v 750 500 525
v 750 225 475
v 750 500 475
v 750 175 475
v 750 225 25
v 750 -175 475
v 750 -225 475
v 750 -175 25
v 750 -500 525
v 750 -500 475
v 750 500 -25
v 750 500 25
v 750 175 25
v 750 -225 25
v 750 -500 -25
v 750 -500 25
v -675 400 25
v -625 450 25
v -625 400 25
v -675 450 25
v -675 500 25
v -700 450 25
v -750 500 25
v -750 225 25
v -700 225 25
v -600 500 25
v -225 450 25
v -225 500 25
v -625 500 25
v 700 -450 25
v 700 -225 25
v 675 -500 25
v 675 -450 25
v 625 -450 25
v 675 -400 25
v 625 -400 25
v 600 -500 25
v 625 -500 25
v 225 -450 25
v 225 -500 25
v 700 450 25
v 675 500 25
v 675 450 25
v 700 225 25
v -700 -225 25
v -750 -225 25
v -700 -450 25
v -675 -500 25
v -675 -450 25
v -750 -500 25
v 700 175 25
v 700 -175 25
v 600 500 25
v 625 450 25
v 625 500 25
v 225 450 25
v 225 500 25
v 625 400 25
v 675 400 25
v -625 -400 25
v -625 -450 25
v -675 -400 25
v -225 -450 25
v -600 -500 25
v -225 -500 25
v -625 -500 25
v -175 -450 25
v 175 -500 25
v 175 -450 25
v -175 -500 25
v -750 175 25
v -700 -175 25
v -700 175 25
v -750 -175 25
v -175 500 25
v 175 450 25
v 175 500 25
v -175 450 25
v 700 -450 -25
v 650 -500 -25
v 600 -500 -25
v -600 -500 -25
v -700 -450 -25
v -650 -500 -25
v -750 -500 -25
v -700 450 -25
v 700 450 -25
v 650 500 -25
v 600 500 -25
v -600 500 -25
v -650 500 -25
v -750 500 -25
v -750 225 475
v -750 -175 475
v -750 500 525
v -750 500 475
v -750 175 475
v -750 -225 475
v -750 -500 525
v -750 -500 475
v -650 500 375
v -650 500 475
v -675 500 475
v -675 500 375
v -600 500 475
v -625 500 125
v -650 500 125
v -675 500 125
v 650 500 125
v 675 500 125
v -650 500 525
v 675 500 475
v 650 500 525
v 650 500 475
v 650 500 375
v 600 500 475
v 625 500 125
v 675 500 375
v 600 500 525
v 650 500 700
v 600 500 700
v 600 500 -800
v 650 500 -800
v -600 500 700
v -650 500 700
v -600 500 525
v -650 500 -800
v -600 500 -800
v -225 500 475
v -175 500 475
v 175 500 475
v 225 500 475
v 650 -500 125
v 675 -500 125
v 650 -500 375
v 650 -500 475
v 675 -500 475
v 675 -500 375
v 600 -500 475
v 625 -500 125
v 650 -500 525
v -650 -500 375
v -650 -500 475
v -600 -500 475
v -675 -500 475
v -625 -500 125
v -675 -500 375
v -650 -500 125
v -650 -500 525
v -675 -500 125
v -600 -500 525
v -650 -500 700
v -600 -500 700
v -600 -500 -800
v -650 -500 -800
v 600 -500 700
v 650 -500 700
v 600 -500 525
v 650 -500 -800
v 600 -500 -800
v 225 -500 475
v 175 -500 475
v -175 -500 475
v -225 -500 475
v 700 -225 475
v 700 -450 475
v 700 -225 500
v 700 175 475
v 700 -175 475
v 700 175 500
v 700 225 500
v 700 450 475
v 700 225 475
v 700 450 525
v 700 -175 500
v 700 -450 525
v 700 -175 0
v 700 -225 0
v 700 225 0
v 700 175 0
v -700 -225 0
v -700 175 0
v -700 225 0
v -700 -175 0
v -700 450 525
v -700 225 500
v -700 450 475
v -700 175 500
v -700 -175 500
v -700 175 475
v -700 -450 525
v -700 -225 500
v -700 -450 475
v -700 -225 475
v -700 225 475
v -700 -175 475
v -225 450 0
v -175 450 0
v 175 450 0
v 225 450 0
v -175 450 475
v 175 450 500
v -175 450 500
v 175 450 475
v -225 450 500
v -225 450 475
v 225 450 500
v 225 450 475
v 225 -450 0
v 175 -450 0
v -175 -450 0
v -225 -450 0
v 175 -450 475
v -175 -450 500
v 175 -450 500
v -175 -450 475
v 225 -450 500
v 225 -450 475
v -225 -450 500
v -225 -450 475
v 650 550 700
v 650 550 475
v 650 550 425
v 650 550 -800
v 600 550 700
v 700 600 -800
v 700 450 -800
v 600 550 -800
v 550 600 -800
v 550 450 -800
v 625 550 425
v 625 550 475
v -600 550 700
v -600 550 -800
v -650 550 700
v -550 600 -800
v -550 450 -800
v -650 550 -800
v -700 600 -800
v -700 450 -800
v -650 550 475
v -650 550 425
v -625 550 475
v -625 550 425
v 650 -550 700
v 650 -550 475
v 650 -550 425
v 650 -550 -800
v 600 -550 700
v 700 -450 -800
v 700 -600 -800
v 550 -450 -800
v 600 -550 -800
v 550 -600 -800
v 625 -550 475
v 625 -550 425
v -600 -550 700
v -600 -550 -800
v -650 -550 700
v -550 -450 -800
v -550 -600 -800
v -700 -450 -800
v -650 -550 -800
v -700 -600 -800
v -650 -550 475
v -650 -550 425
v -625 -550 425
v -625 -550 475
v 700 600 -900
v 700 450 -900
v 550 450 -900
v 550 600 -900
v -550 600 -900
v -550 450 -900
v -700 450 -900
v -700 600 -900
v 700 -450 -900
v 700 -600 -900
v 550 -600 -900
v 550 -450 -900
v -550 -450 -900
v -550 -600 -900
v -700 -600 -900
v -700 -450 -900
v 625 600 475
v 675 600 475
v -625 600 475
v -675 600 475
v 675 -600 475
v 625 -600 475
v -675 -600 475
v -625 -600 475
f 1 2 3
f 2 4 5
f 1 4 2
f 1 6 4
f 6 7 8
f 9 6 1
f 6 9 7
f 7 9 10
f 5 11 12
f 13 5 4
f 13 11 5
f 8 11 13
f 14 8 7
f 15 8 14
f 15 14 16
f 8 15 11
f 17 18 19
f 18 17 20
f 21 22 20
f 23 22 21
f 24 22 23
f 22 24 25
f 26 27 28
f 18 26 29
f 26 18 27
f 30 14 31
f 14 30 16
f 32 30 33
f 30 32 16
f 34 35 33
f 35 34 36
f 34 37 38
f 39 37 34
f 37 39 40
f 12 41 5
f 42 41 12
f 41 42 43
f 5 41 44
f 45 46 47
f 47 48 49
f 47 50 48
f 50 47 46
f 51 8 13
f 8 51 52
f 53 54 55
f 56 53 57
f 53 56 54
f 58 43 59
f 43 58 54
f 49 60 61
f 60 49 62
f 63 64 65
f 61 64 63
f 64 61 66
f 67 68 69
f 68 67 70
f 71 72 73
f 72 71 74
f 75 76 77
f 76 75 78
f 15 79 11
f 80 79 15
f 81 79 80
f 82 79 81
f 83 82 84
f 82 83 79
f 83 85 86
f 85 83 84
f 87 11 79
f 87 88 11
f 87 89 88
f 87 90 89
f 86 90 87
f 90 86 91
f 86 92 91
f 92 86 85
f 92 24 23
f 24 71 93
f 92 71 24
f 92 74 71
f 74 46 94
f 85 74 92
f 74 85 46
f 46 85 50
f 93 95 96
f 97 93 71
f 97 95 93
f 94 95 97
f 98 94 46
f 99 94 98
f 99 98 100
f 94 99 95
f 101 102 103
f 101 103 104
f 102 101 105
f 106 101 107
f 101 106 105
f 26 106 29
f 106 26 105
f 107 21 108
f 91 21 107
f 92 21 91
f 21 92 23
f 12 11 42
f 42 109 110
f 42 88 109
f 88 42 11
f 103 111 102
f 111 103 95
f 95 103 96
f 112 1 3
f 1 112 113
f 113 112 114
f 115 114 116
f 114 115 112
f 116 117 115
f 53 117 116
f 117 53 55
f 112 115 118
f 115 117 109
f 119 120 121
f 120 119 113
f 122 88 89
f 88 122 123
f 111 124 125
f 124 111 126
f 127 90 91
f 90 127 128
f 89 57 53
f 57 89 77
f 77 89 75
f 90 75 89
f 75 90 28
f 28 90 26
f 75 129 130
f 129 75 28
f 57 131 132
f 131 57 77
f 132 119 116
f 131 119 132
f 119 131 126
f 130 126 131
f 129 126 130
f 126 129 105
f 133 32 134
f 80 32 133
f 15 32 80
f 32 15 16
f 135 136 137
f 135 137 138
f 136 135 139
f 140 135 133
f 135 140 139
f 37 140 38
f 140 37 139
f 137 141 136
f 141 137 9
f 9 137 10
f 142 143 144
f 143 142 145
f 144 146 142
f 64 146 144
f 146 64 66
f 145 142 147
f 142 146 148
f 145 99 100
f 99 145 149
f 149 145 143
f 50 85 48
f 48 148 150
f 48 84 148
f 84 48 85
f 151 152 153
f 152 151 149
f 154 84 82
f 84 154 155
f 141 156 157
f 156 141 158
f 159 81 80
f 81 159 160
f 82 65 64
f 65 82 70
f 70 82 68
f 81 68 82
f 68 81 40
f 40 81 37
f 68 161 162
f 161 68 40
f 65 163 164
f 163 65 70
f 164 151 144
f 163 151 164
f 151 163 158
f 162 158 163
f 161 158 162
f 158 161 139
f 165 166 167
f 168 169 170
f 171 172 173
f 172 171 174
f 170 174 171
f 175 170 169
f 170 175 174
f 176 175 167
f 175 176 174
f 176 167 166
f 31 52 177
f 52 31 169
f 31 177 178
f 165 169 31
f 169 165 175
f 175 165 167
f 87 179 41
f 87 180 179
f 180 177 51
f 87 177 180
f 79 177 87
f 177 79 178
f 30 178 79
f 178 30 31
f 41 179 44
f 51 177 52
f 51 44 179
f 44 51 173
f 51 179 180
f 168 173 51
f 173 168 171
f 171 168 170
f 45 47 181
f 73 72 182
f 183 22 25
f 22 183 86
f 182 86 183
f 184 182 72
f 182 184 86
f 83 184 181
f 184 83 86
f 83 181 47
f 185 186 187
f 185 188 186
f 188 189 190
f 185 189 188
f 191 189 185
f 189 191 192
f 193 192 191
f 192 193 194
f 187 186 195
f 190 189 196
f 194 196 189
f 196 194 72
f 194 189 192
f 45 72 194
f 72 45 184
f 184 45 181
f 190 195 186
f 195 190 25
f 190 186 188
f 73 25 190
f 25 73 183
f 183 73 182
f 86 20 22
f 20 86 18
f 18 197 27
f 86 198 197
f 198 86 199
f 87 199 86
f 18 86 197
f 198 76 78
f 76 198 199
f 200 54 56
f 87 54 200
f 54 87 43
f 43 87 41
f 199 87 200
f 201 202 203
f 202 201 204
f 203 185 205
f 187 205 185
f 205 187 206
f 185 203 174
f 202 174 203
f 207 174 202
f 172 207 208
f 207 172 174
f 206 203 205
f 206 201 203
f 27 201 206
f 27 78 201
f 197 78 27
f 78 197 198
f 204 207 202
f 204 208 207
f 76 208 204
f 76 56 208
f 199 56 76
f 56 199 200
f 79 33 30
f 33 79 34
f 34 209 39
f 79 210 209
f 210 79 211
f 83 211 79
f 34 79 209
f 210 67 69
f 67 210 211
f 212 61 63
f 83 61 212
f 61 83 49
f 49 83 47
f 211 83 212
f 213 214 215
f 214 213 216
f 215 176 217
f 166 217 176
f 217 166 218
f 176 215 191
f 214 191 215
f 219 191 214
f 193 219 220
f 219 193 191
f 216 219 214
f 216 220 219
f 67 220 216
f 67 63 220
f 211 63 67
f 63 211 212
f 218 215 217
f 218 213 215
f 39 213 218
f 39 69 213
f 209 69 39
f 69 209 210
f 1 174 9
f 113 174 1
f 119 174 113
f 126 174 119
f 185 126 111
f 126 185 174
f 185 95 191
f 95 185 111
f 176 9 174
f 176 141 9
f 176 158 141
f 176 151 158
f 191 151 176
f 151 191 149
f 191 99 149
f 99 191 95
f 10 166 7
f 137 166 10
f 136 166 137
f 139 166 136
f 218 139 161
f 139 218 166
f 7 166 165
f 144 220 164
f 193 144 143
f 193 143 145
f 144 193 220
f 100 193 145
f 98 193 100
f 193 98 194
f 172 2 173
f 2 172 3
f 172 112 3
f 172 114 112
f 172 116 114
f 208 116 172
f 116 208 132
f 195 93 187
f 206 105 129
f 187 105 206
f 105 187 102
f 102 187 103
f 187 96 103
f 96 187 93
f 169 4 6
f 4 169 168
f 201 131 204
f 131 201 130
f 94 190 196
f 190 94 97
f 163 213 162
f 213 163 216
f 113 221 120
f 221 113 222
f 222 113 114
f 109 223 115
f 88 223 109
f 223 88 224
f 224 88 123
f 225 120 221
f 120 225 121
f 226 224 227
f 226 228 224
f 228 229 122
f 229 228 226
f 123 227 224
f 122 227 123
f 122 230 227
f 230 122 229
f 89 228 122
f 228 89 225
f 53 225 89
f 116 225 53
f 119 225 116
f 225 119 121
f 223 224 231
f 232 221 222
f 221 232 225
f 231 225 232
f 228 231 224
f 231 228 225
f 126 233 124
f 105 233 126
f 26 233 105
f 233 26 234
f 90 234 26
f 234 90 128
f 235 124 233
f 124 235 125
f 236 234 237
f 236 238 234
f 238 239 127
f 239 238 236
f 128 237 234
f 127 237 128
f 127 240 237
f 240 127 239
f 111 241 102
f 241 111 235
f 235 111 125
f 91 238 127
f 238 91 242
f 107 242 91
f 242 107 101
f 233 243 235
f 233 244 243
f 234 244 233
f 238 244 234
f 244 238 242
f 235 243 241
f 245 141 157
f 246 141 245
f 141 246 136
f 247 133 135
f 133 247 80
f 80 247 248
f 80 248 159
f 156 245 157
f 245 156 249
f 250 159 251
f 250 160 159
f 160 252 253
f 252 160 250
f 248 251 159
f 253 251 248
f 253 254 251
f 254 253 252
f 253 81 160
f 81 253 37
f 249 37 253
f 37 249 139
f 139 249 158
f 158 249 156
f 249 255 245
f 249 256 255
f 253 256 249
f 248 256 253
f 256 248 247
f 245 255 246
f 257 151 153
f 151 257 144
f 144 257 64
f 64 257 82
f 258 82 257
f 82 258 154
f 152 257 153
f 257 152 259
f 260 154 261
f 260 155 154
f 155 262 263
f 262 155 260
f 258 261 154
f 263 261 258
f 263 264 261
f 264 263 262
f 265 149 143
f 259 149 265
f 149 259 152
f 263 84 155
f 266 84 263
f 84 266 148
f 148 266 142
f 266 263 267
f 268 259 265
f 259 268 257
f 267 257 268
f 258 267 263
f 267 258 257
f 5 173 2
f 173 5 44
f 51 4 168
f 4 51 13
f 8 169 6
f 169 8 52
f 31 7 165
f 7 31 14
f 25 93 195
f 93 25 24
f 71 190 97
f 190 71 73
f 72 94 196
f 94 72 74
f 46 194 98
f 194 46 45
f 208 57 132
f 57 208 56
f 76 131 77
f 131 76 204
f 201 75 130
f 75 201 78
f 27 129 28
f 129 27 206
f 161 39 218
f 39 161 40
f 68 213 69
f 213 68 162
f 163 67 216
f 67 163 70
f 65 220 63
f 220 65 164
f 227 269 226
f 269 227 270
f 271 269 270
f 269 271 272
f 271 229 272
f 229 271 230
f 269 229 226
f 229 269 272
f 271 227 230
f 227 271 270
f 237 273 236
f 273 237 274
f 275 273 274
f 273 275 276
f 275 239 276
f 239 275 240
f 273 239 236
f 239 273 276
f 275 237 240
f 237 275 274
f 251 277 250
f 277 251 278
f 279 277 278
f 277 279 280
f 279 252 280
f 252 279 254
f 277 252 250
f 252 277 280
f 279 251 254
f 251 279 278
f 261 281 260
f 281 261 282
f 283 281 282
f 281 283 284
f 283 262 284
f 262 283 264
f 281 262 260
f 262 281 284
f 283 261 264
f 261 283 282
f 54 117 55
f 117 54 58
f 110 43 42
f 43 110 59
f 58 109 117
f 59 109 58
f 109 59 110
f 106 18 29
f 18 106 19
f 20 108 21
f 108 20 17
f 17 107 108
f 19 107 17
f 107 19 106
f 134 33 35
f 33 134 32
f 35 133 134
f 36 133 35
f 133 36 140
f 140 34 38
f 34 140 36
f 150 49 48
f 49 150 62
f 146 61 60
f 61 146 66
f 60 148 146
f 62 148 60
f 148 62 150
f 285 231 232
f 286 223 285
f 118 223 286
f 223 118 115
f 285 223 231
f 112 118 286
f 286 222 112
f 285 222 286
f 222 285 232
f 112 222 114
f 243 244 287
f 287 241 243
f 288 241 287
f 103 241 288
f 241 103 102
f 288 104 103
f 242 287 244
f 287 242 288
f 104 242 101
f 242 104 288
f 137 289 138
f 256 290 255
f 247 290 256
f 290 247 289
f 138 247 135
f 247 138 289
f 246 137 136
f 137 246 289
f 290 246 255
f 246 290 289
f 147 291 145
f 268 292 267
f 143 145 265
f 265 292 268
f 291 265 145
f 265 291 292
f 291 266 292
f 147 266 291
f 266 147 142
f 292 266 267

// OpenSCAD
// ===== 본체 파라메터 (상/하단 공유) =====
body_width = 1500;   // X축 너비
body_depth = 1000;   // Y축 깊이
body_height = 50;    // Z축 높이
body_wall = 50;      // 외벽 두께

// 본체 Z축 위치
body_top_z = 0;      // 상단 본체 Z 위치
body_bottom_z = 500; // 하단 본체 Z 위치 (기둥 바닥에 맞춤)

// ===== 기둥 파라메터 =====
pillar_width = 50;   // 기둥 X축 너비
pillar_depth = 50;   // 기둥 Y축 깊이
pillar_height = 1500; // 기둥 높이

// 기둥 위치 계산 (프레임 외곽 모서리에 붙임)
pillar_pos_x = body_width/2 - pillar_width/2 - 100;   // X축 위치
pillar_pos_y = body_depth/2 - pillar_depth/2 + pillar_depth;   // Y축 위치
pillar_pos_z = pillar_height/2 - 100;                 // Z축 위치 (기둥 바닥이 본체 중심에 맞춤)
pillar_offset_z = -700;                            // Z축 추가 오프셋

// ===== 지지대 파라메터 =====
support_width = 50;   // 지지대 X축 너비
support_depth = 50;   // 지지대 Y축 깊이
support_height = body_bottom_z - body_top_z;  // 지지대 높이 (본체 사이 거리)

// 지지대 위치 계산 (양옆 X축 외곽에 붙임)
support_pos_x = body_width/2 - support_width/2;   // X축 위치 (외곽)
support_pos_y_offset = 200;  // Y축 간격 (중심에서 떨어진 거리)
support_pos_z = (body_top_z + body_bottom_z) / 2;  // Z축 위치 (두 본체 중간)

// 전후면 지지대 위치 계산 (Y축 외곽에 붙임)
support_pos_y = body_depth/2 - support_depth/2;   // Y축 위치 (외곽)
support_pos_x_offset = 200;  // X축 간격 (중심에서 떨어진 거리)

// ===== 브라켓 파라메터 (바퀴 받침) =====
bracket_width = 150;   // 브라켓 너비 (X축)
bracket_depth = 150;   // 브라켓 깊이 (Y축)
bracket_height = 100;  // 브라켓 높이 (Z축)

// 브라켓 위치 계산 (기둥 바닥 아래)
pillar_bottom_z = pillar_pos_z + pillar_offset_z - pillar_height/2;  // 기둥 바닥 Z 위치
bracket_pos_z = pillar_bottom_z - bracket_height/2;  // 브라켓 Z 위치

// ===== 삼각형 고정부품 파라메터 =====
gusset_size = 100;                // 삼각형 변 길이
gusset_thickness = body_height;   // 두께 (본체 두께와 동일)

// ===== 본체 모듈 =====
module body() {
    inner_width = body_width - body_wall * 2;
    inner_depth = body_depth - body_wall * 2;

    difference() {
        cube([body_width, body_depth, body_height], center = true);
        cube([inner_width, inner_depth, body_height + 1], center = true);
    }
}

// ===== 기둥 모듈 =====
module pillar() {
    cube([pillar_width, pillar_depth, pillar_height], center = true);
}

// ===== 지지대 모듈 =====
module support() {
    cube([support_width, support_depth, support_height], center = true);
}

// ===== 브라켓 모듈 (바퀴 받침) =====
module bracket() {
    cube([bracket_width, bracket_depth, bracket_height], center = true);
}

// ===== 삼각형 고정부품 모듈 (X축=기둥, Y축=본체) =====
module gusset() {
    // Z축이 기둥방향(수직), Y축이 본체방향(수평), X축이 두께
    rotate([0, -90, 0])
        linear_extrude(height = gusset_thickness, center = true)
            polygon(points = [[0, 0], [gusset_size, 0], [0, gusset_size]]);
}

// ===== 조립 =====
union() {
    // 상단 본체
    translate([0, 0, body_top_z])
        body();

    // 하단 본체
    translate([0, 0, body_bottom_z])
        body();

    // 전면 기둥 2개 (Y 양수 방향)
    translate([pillar_pos_x, pillar_pos_y, pillar_pos_z + pillar_offset_z])
        pillar();
    translate([-pillar_pos_x, pillar_pos_y, pillar_pos_z + pillar_offset_z])
        pillar();

    // 후면 기둥 2개 (Y 음수 방향)
    translate([pillar_pos_x, -pillar_pos_y, pillar_pos_z + pillar_offset_z])
        pillar();
    translate([-pillar_pos_x, -pillar_pos_y, pillar_pos_z + pillar_offset_z])
        pillar();

    // 우측 지지대 2개 (X 양수 방향)
    translate([support_pos_x, support_pos_y_offset, support_pos_z])
        support();
    translate([support_pos_x, -support_pos_y_offset, support_pos_z])
        support();

    // 좌측 지지대 2개 (X 음수 방향)
    translate([-support_pos_x, support_pos_y_offset, support_pos_z])
        support();
    translate([-support_pos_x, -support_pos_y_offset, support_pos_z])
        support();

    // 전면 지지대 2개 (Y 양수 방향)
    translate([support_pos_x_offset, support_pos_y, support_pos_z])
        support();
    translate([-support_pos_x_offset, support_pos_y, support_pos_z])
        support();

    // 후면 지지대 2개 (Y 음수 방향)
    translate([support_pos_x_offset, -support_pos_y, support_pos_z])
        support();
    translate([-support_pos_x_offset, -support_pos_y, support_pos_z])
        support();

    // 전면 브라켓 2개 (Y 양수 방향, 기둥 밑)
    translate([pillar_pos_x, pillar_pos_y, bracket_pos_z])
        bracket();
    translate([-pillar_pos_x, pillar_pos_y, bracket_pos_z])
        bracket();

    // 후면 브라켓 2개 (Y 음수 방향, 기둥 밑)
    translate([pillar_pos_x, -pillar_pos_y, bracket_pos_z])
        bracket();
    translate([-pillar_pos_x, -pillar_pos_y, bracket_pos_z])
        bracket();

    // ===== 상단 본체 삼각형 고정부품 (4개, 본체 위쪽 ㄱ자) =====
    // 전면 우측 기둥 (X+, Y+)
    translate([pillar_pos_x + gusset_thickness/2, pillar_pos_y - pillar_depth/2, body_top_z + body_height/2])
        rotate([0, 0, 180])
        gusset();
    // 전면 좌측 기둥 (X-, Y+)
    translate([-pillar_pos_x - gusset_thickness/2, pillar_pos_y - pillar_depth/2, body_top_z + body_height/2])
        rotate([0, 0, 180])
        mirror([1, 0, 0])
        gusset();
    // 후면 우측 기둥 (X+, Y-)
    translate([pillar_pos_x + gusset_thickness/2, -pillar_pos_y + pillar_depth/2, body_top_z + body_height/2])
        rotate([0, 0, 0])
        gusset();
    // 후면 좌측 기둥 (X-, Y-)
    translate([-pillar_pos_x - gusset_thickness/2, -pillar_pos_y + pillar_depth/2, body_top_z + body_height/2])
        rotate([0, 0, 0])
        mirror([1, 0, 0])
        gusset();

    // ===== 하단 본체 삼각형 고정부품 (4개, 본체 아래쪽 ㄱ자) =====
    // 전면 우측 기둥 (X+, Y+)
    translate([pillar_pos_x + gusset_thickness/2, pillar_pos_y - pillar_depth/2, body_bottom_z - body_height/2])
        rotate([180, 0, 180])
        gusset();
    // 전면 좌측 기둥 (X-, Y+)
    translate([-pillar_pos_x - gusset_thickness/2, pillar_pos_y - pillar_depth/2, body_bottom_z - body_height/2])
        rotate([180, 0, 180])
        mirror([1, 0, 0])
        gusset();
    // 후면 우측 기둥 (X+, Y-)
    translate([pillar_pos_x + gusset_thickness/2, -pillar_pos_y + pillar_depth/2, body_bottom_z - body_height/2])
        rotate([180, 0, 0])
        gusset();
    // 후면 좌측 기둥 (X-, Y-)
    translate([-pillar_pos_x - gusset_thickness/2, -pillar_pos_y + pillar_depth/2, body_bottom_z - body_height/2])
        rotate([180, 0, 0])
        mirror([1, 0, 0])
        gusset();
}
